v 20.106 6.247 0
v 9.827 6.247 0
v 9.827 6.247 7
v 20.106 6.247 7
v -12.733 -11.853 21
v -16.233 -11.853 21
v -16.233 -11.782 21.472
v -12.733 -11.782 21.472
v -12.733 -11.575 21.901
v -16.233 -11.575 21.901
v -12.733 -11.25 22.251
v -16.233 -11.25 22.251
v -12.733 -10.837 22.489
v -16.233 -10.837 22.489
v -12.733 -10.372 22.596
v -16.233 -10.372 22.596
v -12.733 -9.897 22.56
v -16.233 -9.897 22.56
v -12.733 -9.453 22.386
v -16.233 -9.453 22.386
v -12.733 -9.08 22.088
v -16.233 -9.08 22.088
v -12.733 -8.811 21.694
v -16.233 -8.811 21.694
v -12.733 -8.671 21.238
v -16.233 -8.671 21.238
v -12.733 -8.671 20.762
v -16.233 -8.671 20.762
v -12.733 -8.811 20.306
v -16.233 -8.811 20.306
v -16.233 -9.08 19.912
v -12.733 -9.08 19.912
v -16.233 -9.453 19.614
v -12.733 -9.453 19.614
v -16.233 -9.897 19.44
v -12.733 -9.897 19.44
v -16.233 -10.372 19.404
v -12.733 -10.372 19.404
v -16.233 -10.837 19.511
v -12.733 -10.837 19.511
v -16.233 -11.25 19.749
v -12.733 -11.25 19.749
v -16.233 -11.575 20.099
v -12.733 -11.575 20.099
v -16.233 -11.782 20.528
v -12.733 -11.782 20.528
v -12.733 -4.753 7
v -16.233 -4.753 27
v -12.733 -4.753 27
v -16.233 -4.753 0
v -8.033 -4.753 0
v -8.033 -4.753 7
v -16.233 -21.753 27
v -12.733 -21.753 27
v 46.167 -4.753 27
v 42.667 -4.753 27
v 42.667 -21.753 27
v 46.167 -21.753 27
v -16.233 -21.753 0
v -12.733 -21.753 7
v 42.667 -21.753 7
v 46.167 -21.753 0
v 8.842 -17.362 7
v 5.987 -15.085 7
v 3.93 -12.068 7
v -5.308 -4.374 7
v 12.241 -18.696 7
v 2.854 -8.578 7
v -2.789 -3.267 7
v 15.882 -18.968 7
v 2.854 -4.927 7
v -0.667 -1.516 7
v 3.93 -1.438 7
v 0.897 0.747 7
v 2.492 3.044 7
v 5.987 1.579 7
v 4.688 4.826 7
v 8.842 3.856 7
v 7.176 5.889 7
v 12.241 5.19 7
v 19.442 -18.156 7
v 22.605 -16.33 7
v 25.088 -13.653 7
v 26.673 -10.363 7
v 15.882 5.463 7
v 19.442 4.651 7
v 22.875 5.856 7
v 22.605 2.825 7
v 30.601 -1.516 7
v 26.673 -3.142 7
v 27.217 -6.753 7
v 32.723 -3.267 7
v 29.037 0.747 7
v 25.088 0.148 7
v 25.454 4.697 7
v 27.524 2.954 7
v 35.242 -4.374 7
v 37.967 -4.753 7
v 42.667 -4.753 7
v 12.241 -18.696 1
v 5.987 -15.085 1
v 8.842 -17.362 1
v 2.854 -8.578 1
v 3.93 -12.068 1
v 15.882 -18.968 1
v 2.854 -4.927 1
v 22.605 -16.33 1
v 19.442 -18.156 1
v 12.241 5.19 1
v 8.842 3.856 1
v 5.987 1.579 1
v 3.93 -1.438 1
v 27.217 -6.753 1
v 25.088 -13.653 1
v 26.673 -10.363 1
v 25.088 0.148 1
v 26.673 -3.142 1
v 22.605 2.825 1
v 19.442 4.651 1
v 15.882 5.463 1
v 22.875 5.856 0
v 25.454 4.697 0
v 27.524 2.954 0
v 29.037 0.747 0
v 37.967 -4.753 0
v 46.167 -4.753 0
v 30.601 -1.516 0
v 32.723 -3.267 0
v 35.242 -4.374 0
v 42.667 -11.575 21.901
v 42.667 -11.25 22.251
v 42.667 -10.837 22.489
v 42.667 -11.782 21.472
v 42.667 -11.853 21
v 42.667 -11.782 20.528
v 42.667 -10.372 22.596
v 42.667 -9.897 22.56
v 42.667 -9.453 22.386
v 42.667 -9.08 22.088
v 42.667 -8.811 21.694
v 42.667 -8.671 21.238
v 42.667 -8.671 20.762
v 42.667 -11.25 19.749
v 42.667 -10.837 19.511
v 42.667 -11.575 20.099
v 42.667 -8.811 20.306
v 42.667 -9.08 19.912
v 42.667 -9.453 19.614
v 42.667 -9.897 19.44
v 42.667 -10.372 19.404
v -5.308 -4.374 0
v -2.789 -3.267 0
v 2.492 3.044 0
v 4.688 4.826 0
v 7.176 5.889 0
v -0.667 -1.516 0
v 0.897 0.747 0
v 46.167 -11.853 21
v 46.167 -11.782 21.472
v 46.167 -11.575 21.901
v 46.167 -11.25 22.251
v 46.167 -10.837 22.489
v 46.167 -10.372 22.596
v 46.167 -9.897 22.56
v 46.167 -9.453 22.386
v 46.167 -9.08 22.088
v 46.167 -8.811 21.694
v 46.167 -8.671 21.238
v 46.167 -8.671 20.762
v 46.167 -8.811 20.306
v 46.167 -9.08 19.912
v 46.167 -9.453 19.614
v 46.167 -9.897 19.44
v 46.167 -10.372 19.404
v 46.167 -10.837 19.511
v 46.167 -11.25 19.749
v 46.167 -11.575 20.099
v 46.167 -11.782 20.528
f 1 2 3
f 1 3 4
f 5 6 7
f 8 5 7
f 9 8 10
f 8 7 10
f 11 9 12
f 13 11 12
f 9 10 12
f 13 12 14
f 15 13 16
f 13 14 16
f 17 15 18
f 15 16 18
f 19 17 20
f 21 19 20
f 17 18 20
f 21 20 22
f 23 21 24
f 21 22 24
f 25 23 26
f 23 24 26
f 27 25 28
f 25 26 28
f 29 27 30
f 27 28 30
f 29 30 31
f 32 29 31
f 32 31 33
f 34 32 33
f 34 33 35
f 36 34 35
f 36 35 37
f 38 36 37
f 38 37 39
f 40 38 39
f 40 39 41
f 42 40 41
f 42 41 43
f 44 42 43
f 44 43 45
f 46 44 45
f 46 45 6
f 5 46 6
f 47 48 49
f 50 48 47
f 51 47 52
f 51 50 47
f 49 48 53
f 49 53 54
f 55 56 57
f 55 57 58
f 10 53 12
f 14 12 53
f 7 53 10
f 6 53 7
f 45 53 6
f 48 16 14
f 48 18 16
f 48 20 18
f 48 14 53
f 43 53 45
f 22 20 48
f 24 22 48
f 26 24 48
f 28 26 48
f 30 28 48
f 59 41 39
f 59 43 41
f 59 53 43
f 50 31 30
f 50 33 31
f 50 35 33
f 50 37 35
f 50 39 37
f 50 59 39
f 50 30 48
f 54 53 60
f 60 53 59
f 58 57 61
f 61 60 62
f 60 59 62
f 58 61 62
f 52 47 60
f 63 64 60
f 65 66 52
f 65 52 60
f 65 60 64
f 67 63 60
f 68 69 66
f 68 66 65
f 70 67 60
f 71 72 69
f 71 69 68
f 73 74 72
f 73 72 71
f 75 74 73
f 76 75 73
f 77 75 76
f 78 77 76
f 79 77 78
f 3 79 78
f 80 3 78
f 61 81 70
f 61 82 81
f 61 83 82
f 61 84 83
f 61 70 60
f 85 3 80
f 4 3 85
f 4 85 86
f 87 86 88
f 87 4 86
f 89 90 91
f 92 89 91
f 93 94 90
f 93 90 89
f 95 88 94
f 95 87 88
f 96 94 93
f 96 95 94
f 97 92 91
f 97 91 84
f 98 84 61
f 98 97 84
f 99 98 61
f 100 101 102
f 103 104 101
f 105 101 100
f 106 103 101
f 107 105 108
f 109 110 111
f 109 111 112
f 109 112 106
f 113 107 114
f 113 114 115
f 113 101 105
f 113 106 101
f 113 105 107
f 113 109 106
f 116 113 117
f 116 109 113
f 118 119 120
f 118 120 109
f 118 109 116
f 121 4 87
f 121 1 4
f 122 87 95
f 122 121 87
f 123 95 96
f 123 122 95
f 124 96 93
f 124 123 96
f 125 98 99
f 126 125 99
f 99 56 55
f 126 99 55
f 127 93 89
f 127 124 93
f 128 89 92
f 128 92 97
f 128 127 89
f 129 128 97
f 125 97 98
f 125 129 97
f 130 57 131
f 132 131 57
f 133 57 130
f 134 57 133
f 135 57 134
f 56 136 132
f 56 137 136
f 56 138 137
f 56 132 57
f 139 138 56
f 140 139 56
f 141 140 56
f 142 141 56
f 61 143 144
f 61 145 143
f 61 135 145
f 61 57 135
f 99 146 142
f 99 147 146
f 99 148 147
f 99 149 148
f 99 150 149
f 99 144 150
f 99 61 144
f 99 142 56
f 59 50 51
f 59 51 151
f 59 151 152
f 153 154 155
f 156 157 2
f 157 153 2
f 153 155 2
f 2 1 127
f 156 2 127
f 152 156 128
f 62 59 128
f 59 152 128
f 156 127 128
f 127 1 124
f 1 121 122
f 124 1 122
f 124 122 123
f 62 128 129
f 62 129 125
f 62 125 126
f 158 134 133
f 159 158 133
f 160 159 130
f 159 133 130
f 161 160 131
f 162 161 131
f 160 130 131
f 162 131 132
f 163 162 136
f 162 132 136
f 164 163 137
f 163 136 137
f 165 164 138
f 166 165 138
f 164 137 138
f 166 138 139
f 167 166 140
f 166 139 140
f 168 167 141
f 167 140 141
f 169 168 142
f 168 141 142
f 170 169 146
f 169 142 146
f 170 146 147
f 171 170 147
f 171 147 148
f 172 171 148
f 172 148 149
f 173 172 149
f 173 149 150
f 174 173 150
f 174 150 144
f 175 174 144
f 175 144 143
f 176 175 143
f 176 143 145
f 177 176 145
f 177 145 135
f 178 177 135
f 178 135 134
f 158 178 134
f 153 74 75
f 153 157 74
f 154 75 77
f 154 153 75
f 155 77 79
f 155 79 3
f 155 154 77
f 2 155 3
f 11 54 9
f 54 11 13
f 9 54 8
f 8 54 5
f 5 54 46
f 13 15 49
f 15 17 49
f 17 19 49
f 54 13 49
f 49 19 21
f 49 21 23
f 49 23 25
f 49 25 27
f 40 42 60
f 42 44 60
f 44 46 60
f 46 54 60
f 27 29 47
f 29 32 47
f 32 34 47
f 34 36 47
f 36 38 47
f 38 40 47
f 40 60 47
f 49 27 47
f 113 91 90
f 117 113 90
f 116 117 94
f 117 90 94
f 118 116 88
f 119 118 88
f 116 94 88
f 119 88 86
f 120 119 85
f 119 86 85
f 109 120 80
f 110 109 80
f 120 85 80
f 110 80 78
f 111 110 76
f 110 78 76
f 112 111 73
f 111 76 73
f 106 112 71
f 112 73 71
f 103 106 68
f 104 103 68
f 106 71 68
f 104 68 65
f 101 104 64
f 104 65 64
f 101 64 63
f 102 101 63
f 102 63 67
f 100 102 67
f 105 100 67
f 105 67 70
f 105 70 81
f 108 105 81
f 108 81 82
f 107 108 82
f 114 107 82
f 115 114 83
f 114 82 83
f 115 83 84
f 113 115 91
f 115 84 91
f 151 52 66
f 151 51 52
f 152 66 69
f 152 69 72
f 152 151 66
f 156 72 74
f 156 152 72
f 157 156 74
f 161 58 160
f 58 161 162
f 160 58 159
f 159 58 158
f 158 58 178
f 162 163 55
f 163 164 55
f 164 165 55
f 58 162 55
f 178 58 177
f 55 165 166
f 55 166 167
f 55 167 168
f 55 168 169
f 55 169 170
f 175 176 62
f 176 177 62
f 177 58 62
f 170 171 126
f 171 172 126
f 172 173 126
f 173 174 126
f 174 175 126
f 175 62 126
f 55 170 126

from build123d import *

# Parameters (mm, degrees)
SKETCH1_W           = 62.4
SKETCH1_H           = 28
BOSS_EXTRUDE2_DEPTH = 7
SKETCH3_R           = 12.25
CUT_EXTRUDE2_DEPTH  = 6
CUT_EXTRUDE3_REACH  = 53.513
SKETCH4_W           = 18.2
SKETCH4_H           = 11
FILLET1_R           = 10
FILLET2_R           = 10
SKETCH5_W           = 3.5
SKETCH5_H           = 17
BOSS_EXTRUDE3_DEPTH = 20
SKETCH6_R           = 1.6
CUT_EXTRUDE4_DEPTH  = 72.38585011


with BuildPart() as part:
    # Sketch1 → Boss-Extrude2 (new body)
    with BuildSketch(Plane.XY):
        with Locations((14.966835682, -7.752691308)):
            Rectangle(SKETCH1_W, SKETCH1_H)
    extrude(amount=BOSS_EXTRUDE2_DEPTH)

    # Sketch3 → Cut-Extrude2 (cut)
    with BuildSketch(Plane.XY.offset(7)):
        with Locations((14.966835682, -6.752691308)):
            Circle(SKETCH3_R)
    extrude(amount=-CUT_EXTRUDE2_DEPTH, mode=Mode.SUBTRACT)

    # Sketch4 → Cut-Extrude3 (cut, up to next)
    with BuildSketch(Plane.XY.offset(7), mode=Mode.PRIVATE) as cut_extrude3_sk1:
        with Locations((-7.133164318, 0.747308692)):
            Rectangle(SKETCH4_W, SKETCH4_H)
    cut_extrude3_tool1 = extrude(cut_extrude3_sk1.sketch, amount=-CUT_EXTRUDE3_REACH, mode=Mode.PRIVATE) & part.part
    # Sketch4 → Cut-Extrude3 (cut, up to next)
    with BuildSketch(Plane.XY.offset(7), mode=Mode.PRIVATE) as cut_extrude3_sk2:
        with Locations((37.066835682, 0.747308692)):
            Rectangle(SKETCH4_W, SKETCH4_H)
    cut_extrude3_tool2 = extrude(cut_extrude3_sk2.sketch, amount=-CUT_EXTRUDE3_REACH, mode=Mode.PRIVATE) & part.part
    add(cut_extrude3_tool1.solids().sort_by_distance((-7.133164, 0.747309, 7))[0], mode=Mode.SUBTRACT)
    add(cut_extrude3_tool2.solids().sort_by_distance((37.066836, 0.747309, 7))[0], mode=Mode.SUBTRACT)

    # Fillet1
    fillet1_edges = [part.edges().sort_by_distance(p)[0] for p in [
        (1.966835682, -4.752691308, 3.5),
        (27.966835682, -4.752691308, 3.5),
    ]]
    fillet(fillet1_edges, radius=FILLET1_R)

    # Fillet2
    fillet2_edges = [part.edges().sort_by_distance(p)[0] for p in [
        (27.966835682, 6.247308692, 3.5),
        (1.966835682, 6.247308692, 3.5),
    ]]
    fillet(fillet2_edges, radius=FILLET2_R)

    # Sketch5 → Boss-Extrude3 (add)
    with BuildSketch(Plane.XY.offset(7)):
        with Locations((-14.483164318, -13.252691308)):
            Rectangle(SKETCH5_W, SKETCH5_H)
        with Locations((44.416835682, -13.252691308)):
            Rectangle(SKETCH5_W, SKETCH5_H)
    extrude(amount=BOSS_EXTRUDE3_DEPTH)

    # Sketch6 → Cut-Extrude4 (cut, through all)
    with BuildSketch(Plane.ZY.offset(16.233164318)):
        with Locations(Location((21, -10.252691308, 0), (0, 0, 270))):
            Circle(SKETCH6_R)
    extrude(amount=-CUT_EXTRUDE4_DEPTH, mode=Mode.SUBTRACT)


solid = part.part
